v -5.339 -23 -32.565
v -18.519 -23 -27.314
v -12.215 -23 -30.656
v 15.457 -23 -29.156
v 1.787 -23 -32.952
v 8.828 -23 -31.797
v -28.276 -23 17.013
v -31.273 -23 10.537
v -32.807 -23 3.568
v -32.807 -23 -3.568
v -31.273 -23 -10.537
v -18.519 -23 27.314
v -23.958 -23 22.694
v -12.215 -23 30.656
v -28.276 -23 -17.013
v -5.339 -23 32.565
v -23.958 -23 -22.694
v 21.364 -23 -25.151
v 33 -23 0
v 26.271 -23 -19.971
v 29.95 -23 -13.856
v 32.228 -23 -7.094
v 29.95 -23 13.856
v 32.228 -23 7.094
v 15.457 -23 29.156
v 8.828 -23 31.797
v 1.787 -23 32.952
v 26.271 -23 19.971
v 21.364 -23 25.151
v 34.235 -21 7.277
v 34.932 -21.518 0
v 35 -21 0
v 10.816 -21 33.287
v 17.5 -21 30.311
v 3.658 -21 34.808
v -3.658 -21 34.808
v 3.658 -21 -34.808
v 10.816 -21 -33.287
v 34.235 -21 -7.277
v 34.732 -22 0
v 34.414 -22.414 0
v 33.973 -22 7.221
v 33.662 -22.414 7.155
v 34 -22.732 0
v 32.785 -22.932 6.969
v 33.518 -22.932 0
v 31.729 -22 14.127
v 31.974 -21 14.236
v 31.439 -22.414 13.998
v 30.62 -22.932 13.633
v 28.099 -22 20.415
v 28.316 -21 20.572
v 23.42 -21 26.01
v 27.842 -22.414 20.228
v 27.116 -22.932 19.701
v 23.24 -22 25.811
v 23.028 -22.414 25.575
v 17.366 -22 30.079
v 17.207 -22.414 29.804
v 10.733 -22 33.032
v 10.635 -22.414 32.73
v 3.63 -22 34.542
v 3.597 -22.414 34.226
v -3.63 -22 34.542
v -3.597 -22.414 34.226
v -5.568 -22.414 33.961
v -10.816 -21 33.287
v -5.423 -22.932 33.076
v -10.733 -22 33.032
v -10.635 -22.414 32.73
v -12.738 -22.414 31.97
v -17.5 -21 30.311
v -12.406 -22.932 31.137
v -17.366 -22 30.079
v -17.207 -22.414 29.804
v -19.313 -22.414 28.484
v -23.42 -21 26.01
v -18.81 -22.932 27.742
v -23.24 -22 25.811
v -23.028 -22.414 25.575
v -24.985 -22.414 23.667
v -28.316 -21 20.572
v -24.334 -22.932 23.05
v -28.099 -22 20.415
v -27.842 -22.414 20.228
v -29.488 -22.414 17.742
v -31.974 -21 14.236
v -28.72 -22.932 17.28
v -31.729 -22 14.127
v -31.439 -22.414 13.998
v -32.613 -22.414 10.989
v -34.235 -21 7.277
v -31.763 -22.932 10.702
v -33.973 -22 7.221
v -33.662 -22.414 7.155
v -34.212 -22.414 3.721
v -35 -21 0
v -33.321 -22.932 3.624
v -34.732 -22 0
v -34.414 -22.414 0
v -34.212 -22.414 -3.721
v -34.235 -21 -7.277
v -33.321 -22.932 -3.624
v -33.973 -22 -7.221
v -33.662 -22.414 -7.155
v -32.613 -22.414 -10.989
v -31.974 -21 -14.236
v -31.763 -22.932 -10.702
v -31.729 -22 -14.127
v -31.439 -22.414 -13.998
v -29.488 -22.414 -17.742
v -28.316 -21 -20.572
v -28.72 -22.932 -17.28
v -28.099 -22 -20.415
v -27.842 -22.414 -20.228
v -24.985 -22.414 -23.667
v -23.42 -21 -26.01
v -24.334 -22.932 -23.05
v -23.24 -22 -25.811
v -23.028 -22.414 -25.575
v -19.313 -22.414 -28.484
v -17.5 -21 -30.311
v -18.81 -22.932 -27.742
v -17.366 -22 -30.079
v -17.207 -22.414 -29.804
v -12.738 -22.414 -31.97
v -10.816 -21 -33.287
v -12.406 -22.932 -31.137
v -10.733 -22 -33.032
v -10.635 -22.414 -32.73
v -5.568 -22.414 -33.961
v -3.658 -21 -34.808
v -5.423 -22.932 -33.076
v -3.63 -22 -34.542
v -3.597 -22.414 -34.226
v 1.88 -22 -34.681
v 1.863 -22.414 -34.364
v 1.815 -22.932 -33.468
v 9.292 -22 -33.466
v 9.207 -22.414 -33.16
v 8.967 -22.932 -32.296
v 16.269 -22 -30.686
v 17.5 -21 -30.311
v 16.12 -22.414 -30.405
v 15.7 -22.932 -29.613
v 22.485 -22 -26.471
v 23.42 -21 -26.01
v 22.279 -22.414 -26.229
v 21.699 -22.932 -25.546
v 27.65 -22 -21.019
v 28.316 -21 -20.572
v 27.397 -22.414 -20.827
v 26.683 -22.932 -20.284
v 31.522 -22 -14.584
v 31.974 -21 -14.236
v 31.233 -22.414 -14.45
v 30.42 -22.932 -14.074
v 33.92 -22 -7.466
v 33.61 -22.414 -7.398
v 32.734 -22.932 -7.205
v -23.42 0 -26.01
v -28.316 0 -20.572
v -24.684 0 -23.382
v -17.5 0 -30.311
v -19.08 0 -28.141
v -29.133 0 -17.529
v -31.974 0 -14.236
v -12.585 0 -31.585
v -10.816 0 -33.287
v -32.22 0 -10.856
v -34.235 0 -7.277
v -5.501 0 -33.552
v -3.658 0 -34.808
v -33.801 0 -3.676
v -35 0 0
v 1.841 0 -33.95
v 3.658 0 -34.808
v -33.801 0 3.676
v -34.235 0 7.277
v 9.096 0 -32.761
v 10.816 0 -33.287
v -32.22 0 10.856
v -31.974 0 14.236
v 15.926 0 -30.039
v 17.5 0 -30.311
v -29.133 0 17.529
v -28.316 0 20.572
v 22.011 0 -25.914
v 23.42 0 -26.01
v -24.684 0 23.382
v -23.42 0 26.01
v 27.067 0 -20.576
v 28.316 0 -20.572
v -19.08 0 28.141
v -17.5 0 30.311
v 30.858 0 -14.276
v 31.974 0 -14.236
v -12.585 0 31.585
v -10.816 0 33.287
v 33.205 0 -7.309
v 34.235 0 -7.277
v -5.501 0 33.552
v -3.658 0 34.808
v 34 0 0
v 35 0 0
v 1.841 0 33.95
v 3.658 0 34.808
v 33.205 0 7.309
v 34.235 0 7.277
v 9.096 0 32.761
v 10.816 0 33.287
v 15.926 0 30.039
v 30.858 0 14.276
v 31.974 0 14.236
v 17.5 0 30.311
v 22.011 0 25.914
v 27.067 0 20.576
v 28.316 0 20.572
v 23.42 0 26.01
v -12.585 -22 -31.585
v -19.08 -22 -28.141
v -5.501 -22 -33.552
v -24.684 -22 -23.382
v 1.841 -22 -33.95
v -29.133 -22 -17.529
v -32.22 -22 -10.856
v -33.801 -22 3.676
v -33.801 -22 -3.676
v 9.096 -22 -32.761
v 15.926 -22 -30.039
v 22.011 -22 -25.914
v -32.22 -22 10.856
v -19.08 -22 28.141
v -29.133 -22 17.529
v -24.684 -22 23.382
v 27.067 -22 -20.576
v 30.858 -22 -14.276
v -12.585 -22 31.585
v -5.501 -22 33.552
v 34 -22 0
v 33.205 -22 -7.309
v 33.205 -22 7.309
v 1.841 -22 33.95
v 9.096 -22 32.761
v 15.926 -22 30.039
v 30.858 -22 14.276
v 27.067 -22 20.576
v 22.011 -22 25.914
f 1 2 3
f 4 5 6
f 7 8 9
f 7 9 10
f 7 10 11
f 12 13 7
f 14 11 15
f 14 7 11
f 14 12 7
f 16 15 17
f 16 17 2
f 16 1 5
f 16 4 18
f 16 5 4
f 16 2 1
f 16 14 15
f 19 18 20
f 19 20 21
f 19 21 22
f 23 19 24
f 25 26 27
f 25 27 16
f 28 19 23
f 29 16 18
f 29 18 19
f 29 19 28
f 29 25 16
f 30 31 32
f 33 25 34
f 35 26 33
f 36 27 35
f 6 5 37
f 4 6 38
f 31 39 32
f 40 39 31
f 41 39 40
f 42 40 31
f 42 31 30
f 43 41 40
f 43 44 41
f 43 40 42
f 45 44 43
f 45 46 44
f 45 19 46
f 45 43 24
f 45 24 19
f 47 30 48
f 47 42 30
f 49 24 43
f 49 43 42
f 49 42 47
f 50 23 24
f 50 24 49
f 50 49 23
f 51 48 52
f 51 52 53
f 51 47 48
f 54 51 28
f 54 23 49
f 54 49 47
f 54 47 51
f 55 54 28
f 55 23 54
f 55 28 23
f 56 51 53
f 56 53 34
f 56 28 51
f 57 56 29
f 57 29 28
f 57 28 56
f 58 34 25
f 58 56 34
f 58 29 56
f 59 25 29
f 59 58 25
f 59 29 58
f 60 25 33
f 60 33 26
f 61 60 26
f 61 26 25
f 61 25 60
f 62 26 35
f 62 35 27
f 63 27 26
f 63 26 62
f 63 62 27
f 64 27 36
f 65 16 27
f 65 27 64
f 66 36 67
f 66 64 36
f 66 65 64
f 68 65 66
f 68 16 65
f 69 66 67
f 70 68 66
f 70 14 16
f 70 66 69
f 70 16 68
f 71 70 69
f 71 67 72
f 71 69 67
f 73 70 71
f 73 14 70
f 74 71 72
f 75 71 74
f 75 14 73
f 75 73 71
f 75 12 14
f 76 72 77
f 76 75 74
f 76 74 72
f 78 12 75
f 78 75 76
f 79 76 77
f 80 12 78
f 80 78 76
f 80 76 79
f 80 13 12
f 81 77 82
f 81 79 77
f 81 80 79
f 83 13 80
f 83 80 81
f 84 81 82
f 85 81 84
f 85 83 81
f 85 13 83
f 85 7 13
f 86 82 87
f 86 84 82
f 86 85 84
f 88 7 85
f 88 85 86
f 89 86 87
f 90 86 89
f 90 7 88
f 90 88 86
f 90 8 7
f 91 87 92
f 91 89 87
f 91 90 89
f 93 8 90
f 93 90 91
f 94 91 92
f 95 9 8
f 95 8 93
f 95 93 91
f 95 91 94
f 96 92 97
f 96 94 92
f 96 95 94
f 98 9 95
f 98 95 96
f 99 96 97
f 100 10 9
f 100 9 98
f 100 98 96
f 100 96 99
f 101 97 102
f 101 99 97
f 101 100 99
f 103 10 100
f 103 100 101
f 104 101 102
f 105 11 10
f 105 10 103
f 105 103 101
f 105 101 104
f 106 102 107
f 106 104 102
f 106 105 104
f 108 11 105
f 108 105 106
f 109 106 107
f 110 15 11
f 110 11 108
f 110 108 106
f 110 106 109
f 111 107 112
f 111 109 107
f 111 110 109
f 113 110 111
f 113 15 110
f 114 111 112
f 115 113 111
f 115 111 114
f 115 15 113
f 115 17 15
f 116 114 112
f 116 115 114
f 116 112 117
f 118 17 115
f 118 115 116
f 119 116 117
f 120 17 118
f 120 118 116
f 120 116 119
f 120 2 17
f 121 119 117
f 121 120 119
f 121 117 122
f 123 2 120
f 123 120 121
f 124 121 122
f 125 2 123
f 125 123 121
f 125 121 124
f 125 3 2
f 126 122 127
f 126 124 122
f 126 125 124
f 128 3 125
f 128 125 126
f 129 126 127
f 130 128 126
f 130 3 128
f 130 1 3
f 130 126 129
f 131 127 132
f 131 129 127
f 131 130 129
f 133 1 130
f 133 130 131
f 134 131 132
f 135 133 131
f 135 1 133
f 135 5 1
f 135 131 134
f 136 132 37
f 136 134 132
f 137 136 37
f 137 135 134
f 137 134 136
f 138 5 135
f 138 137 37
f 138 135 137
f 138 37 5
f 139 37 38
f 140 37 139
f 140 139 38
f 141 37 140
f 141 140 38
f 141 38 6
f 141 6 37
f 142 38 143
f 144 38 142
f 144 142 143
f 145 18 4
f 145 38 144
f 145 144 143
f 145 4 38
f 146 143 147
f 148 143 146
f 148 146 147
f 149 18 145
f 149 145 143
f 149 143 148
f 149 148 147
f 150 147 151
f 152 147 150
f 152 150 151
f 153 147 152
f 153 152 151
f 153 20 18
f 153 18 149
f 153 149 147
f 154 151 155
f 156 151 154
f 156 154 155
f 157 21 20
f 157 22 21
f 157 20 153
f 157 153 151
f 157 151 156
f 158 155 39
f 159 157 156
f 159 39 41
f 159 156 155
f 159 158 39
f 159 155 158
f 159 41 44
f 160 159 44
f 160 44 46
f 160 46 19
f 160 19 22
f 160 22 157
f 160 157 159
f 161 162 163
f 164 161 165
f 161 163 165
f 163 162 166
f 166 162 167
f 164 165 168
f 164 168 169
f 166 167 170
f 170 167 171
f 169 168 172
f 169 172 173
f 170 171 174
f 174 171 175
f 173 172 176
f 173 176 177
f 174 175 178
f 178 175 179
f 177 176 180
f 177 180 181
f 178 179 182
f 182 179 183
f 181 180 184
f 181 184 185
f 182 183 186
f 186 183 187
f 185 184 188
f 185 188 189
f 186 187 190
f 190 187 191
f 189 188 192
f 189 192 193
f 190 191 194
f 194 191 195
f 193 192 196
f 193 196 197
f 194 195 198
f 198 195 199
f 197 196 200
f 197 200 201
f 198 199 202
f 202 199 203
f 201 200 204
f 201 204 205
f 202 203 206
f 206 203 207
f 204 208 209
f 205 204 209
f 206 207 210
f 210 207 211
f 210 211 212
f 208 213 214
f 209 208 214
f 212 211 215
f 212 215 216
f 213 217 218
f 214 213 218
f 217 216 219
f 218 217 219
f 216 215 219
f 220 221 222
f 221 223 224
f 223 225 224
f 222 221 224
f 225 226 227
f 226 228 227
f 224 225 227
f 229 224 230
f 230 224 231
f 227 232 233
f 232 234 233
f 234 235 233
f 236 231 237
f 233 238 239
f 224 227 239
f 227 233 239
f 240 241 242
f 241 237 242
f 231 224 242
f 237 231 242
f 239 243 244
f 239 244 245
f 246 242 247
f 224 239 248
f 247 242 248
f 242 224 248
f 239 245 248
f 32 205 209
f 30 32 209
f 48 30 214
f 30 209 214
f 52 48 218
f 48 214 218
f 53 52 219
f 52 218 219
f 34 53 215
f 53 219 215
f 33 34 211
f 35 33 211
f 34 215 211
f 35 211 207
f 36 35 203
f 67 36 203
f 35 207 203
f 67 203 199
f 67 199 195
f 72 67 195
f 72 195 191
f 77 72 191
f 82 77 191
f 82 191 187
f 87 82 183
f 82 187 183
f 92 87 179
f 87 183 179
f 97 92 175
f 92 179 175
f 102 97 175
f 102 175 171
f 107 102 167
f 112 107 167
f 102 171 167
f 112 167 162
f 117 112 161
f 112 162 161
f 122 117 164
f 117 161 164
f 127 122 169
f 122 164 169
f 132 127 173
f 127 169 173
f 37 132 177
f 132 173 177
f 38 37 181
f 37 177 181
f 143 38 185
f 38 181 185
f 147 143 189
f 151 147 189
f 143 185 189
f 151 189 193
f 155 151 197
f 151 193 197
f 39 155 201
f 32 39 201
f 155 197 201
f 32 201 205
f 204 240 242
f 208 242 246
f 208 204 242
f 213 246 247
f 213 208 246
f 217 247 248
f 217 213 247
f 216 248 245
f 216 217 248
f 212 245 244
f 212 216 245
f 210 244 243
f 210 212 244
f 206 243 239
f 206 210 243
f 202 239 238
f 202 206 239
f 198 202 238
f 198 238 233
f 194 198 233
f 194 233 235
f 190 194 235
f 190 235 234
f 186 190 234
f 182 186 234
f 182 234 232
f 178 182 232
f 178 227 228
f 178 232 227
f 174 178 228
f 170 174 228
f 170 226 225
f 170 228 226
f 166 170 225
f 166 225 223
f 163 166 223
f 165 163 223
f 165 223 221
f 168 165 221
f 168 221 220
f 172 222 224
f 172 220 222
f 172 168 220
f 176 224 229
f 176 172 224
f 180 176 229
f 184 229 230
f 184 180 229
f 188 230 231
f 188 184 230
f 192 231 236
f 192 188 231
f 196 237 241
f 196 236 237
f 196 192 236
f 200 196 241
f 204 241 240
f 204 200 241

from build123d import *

# Parameters (mm, degrees)
F0_R     = 35
F1_DEPTH = 23
F2_T     = -1
F3_R     = 2


# Not quite as in the source:
# - a feature of the source that left no trace in its solid (it failed there, or was rolled back) is left out


with BuildPart() as f1:
    # F0 (on Front) → F1 (new body)
    with BuildSketch(Plane.XZ):
        Circle(F0_R)
    extrude(amount=F1_DEPTH)

    # F2
    f2_openings = [f1.faces().sort_by_distance(p)[0] for p in [
        (0, 0, 0),
    ]]
    offset(amount=F2_T, openings=f2_openings)

    # F3
    f3_edges = [f1.edges().sort_by_distance(p)[0] for p in [
        (-35, -23, 0),
    ]]
    fillet(f3_edges, radius=F3_R)


solid = f1.part
